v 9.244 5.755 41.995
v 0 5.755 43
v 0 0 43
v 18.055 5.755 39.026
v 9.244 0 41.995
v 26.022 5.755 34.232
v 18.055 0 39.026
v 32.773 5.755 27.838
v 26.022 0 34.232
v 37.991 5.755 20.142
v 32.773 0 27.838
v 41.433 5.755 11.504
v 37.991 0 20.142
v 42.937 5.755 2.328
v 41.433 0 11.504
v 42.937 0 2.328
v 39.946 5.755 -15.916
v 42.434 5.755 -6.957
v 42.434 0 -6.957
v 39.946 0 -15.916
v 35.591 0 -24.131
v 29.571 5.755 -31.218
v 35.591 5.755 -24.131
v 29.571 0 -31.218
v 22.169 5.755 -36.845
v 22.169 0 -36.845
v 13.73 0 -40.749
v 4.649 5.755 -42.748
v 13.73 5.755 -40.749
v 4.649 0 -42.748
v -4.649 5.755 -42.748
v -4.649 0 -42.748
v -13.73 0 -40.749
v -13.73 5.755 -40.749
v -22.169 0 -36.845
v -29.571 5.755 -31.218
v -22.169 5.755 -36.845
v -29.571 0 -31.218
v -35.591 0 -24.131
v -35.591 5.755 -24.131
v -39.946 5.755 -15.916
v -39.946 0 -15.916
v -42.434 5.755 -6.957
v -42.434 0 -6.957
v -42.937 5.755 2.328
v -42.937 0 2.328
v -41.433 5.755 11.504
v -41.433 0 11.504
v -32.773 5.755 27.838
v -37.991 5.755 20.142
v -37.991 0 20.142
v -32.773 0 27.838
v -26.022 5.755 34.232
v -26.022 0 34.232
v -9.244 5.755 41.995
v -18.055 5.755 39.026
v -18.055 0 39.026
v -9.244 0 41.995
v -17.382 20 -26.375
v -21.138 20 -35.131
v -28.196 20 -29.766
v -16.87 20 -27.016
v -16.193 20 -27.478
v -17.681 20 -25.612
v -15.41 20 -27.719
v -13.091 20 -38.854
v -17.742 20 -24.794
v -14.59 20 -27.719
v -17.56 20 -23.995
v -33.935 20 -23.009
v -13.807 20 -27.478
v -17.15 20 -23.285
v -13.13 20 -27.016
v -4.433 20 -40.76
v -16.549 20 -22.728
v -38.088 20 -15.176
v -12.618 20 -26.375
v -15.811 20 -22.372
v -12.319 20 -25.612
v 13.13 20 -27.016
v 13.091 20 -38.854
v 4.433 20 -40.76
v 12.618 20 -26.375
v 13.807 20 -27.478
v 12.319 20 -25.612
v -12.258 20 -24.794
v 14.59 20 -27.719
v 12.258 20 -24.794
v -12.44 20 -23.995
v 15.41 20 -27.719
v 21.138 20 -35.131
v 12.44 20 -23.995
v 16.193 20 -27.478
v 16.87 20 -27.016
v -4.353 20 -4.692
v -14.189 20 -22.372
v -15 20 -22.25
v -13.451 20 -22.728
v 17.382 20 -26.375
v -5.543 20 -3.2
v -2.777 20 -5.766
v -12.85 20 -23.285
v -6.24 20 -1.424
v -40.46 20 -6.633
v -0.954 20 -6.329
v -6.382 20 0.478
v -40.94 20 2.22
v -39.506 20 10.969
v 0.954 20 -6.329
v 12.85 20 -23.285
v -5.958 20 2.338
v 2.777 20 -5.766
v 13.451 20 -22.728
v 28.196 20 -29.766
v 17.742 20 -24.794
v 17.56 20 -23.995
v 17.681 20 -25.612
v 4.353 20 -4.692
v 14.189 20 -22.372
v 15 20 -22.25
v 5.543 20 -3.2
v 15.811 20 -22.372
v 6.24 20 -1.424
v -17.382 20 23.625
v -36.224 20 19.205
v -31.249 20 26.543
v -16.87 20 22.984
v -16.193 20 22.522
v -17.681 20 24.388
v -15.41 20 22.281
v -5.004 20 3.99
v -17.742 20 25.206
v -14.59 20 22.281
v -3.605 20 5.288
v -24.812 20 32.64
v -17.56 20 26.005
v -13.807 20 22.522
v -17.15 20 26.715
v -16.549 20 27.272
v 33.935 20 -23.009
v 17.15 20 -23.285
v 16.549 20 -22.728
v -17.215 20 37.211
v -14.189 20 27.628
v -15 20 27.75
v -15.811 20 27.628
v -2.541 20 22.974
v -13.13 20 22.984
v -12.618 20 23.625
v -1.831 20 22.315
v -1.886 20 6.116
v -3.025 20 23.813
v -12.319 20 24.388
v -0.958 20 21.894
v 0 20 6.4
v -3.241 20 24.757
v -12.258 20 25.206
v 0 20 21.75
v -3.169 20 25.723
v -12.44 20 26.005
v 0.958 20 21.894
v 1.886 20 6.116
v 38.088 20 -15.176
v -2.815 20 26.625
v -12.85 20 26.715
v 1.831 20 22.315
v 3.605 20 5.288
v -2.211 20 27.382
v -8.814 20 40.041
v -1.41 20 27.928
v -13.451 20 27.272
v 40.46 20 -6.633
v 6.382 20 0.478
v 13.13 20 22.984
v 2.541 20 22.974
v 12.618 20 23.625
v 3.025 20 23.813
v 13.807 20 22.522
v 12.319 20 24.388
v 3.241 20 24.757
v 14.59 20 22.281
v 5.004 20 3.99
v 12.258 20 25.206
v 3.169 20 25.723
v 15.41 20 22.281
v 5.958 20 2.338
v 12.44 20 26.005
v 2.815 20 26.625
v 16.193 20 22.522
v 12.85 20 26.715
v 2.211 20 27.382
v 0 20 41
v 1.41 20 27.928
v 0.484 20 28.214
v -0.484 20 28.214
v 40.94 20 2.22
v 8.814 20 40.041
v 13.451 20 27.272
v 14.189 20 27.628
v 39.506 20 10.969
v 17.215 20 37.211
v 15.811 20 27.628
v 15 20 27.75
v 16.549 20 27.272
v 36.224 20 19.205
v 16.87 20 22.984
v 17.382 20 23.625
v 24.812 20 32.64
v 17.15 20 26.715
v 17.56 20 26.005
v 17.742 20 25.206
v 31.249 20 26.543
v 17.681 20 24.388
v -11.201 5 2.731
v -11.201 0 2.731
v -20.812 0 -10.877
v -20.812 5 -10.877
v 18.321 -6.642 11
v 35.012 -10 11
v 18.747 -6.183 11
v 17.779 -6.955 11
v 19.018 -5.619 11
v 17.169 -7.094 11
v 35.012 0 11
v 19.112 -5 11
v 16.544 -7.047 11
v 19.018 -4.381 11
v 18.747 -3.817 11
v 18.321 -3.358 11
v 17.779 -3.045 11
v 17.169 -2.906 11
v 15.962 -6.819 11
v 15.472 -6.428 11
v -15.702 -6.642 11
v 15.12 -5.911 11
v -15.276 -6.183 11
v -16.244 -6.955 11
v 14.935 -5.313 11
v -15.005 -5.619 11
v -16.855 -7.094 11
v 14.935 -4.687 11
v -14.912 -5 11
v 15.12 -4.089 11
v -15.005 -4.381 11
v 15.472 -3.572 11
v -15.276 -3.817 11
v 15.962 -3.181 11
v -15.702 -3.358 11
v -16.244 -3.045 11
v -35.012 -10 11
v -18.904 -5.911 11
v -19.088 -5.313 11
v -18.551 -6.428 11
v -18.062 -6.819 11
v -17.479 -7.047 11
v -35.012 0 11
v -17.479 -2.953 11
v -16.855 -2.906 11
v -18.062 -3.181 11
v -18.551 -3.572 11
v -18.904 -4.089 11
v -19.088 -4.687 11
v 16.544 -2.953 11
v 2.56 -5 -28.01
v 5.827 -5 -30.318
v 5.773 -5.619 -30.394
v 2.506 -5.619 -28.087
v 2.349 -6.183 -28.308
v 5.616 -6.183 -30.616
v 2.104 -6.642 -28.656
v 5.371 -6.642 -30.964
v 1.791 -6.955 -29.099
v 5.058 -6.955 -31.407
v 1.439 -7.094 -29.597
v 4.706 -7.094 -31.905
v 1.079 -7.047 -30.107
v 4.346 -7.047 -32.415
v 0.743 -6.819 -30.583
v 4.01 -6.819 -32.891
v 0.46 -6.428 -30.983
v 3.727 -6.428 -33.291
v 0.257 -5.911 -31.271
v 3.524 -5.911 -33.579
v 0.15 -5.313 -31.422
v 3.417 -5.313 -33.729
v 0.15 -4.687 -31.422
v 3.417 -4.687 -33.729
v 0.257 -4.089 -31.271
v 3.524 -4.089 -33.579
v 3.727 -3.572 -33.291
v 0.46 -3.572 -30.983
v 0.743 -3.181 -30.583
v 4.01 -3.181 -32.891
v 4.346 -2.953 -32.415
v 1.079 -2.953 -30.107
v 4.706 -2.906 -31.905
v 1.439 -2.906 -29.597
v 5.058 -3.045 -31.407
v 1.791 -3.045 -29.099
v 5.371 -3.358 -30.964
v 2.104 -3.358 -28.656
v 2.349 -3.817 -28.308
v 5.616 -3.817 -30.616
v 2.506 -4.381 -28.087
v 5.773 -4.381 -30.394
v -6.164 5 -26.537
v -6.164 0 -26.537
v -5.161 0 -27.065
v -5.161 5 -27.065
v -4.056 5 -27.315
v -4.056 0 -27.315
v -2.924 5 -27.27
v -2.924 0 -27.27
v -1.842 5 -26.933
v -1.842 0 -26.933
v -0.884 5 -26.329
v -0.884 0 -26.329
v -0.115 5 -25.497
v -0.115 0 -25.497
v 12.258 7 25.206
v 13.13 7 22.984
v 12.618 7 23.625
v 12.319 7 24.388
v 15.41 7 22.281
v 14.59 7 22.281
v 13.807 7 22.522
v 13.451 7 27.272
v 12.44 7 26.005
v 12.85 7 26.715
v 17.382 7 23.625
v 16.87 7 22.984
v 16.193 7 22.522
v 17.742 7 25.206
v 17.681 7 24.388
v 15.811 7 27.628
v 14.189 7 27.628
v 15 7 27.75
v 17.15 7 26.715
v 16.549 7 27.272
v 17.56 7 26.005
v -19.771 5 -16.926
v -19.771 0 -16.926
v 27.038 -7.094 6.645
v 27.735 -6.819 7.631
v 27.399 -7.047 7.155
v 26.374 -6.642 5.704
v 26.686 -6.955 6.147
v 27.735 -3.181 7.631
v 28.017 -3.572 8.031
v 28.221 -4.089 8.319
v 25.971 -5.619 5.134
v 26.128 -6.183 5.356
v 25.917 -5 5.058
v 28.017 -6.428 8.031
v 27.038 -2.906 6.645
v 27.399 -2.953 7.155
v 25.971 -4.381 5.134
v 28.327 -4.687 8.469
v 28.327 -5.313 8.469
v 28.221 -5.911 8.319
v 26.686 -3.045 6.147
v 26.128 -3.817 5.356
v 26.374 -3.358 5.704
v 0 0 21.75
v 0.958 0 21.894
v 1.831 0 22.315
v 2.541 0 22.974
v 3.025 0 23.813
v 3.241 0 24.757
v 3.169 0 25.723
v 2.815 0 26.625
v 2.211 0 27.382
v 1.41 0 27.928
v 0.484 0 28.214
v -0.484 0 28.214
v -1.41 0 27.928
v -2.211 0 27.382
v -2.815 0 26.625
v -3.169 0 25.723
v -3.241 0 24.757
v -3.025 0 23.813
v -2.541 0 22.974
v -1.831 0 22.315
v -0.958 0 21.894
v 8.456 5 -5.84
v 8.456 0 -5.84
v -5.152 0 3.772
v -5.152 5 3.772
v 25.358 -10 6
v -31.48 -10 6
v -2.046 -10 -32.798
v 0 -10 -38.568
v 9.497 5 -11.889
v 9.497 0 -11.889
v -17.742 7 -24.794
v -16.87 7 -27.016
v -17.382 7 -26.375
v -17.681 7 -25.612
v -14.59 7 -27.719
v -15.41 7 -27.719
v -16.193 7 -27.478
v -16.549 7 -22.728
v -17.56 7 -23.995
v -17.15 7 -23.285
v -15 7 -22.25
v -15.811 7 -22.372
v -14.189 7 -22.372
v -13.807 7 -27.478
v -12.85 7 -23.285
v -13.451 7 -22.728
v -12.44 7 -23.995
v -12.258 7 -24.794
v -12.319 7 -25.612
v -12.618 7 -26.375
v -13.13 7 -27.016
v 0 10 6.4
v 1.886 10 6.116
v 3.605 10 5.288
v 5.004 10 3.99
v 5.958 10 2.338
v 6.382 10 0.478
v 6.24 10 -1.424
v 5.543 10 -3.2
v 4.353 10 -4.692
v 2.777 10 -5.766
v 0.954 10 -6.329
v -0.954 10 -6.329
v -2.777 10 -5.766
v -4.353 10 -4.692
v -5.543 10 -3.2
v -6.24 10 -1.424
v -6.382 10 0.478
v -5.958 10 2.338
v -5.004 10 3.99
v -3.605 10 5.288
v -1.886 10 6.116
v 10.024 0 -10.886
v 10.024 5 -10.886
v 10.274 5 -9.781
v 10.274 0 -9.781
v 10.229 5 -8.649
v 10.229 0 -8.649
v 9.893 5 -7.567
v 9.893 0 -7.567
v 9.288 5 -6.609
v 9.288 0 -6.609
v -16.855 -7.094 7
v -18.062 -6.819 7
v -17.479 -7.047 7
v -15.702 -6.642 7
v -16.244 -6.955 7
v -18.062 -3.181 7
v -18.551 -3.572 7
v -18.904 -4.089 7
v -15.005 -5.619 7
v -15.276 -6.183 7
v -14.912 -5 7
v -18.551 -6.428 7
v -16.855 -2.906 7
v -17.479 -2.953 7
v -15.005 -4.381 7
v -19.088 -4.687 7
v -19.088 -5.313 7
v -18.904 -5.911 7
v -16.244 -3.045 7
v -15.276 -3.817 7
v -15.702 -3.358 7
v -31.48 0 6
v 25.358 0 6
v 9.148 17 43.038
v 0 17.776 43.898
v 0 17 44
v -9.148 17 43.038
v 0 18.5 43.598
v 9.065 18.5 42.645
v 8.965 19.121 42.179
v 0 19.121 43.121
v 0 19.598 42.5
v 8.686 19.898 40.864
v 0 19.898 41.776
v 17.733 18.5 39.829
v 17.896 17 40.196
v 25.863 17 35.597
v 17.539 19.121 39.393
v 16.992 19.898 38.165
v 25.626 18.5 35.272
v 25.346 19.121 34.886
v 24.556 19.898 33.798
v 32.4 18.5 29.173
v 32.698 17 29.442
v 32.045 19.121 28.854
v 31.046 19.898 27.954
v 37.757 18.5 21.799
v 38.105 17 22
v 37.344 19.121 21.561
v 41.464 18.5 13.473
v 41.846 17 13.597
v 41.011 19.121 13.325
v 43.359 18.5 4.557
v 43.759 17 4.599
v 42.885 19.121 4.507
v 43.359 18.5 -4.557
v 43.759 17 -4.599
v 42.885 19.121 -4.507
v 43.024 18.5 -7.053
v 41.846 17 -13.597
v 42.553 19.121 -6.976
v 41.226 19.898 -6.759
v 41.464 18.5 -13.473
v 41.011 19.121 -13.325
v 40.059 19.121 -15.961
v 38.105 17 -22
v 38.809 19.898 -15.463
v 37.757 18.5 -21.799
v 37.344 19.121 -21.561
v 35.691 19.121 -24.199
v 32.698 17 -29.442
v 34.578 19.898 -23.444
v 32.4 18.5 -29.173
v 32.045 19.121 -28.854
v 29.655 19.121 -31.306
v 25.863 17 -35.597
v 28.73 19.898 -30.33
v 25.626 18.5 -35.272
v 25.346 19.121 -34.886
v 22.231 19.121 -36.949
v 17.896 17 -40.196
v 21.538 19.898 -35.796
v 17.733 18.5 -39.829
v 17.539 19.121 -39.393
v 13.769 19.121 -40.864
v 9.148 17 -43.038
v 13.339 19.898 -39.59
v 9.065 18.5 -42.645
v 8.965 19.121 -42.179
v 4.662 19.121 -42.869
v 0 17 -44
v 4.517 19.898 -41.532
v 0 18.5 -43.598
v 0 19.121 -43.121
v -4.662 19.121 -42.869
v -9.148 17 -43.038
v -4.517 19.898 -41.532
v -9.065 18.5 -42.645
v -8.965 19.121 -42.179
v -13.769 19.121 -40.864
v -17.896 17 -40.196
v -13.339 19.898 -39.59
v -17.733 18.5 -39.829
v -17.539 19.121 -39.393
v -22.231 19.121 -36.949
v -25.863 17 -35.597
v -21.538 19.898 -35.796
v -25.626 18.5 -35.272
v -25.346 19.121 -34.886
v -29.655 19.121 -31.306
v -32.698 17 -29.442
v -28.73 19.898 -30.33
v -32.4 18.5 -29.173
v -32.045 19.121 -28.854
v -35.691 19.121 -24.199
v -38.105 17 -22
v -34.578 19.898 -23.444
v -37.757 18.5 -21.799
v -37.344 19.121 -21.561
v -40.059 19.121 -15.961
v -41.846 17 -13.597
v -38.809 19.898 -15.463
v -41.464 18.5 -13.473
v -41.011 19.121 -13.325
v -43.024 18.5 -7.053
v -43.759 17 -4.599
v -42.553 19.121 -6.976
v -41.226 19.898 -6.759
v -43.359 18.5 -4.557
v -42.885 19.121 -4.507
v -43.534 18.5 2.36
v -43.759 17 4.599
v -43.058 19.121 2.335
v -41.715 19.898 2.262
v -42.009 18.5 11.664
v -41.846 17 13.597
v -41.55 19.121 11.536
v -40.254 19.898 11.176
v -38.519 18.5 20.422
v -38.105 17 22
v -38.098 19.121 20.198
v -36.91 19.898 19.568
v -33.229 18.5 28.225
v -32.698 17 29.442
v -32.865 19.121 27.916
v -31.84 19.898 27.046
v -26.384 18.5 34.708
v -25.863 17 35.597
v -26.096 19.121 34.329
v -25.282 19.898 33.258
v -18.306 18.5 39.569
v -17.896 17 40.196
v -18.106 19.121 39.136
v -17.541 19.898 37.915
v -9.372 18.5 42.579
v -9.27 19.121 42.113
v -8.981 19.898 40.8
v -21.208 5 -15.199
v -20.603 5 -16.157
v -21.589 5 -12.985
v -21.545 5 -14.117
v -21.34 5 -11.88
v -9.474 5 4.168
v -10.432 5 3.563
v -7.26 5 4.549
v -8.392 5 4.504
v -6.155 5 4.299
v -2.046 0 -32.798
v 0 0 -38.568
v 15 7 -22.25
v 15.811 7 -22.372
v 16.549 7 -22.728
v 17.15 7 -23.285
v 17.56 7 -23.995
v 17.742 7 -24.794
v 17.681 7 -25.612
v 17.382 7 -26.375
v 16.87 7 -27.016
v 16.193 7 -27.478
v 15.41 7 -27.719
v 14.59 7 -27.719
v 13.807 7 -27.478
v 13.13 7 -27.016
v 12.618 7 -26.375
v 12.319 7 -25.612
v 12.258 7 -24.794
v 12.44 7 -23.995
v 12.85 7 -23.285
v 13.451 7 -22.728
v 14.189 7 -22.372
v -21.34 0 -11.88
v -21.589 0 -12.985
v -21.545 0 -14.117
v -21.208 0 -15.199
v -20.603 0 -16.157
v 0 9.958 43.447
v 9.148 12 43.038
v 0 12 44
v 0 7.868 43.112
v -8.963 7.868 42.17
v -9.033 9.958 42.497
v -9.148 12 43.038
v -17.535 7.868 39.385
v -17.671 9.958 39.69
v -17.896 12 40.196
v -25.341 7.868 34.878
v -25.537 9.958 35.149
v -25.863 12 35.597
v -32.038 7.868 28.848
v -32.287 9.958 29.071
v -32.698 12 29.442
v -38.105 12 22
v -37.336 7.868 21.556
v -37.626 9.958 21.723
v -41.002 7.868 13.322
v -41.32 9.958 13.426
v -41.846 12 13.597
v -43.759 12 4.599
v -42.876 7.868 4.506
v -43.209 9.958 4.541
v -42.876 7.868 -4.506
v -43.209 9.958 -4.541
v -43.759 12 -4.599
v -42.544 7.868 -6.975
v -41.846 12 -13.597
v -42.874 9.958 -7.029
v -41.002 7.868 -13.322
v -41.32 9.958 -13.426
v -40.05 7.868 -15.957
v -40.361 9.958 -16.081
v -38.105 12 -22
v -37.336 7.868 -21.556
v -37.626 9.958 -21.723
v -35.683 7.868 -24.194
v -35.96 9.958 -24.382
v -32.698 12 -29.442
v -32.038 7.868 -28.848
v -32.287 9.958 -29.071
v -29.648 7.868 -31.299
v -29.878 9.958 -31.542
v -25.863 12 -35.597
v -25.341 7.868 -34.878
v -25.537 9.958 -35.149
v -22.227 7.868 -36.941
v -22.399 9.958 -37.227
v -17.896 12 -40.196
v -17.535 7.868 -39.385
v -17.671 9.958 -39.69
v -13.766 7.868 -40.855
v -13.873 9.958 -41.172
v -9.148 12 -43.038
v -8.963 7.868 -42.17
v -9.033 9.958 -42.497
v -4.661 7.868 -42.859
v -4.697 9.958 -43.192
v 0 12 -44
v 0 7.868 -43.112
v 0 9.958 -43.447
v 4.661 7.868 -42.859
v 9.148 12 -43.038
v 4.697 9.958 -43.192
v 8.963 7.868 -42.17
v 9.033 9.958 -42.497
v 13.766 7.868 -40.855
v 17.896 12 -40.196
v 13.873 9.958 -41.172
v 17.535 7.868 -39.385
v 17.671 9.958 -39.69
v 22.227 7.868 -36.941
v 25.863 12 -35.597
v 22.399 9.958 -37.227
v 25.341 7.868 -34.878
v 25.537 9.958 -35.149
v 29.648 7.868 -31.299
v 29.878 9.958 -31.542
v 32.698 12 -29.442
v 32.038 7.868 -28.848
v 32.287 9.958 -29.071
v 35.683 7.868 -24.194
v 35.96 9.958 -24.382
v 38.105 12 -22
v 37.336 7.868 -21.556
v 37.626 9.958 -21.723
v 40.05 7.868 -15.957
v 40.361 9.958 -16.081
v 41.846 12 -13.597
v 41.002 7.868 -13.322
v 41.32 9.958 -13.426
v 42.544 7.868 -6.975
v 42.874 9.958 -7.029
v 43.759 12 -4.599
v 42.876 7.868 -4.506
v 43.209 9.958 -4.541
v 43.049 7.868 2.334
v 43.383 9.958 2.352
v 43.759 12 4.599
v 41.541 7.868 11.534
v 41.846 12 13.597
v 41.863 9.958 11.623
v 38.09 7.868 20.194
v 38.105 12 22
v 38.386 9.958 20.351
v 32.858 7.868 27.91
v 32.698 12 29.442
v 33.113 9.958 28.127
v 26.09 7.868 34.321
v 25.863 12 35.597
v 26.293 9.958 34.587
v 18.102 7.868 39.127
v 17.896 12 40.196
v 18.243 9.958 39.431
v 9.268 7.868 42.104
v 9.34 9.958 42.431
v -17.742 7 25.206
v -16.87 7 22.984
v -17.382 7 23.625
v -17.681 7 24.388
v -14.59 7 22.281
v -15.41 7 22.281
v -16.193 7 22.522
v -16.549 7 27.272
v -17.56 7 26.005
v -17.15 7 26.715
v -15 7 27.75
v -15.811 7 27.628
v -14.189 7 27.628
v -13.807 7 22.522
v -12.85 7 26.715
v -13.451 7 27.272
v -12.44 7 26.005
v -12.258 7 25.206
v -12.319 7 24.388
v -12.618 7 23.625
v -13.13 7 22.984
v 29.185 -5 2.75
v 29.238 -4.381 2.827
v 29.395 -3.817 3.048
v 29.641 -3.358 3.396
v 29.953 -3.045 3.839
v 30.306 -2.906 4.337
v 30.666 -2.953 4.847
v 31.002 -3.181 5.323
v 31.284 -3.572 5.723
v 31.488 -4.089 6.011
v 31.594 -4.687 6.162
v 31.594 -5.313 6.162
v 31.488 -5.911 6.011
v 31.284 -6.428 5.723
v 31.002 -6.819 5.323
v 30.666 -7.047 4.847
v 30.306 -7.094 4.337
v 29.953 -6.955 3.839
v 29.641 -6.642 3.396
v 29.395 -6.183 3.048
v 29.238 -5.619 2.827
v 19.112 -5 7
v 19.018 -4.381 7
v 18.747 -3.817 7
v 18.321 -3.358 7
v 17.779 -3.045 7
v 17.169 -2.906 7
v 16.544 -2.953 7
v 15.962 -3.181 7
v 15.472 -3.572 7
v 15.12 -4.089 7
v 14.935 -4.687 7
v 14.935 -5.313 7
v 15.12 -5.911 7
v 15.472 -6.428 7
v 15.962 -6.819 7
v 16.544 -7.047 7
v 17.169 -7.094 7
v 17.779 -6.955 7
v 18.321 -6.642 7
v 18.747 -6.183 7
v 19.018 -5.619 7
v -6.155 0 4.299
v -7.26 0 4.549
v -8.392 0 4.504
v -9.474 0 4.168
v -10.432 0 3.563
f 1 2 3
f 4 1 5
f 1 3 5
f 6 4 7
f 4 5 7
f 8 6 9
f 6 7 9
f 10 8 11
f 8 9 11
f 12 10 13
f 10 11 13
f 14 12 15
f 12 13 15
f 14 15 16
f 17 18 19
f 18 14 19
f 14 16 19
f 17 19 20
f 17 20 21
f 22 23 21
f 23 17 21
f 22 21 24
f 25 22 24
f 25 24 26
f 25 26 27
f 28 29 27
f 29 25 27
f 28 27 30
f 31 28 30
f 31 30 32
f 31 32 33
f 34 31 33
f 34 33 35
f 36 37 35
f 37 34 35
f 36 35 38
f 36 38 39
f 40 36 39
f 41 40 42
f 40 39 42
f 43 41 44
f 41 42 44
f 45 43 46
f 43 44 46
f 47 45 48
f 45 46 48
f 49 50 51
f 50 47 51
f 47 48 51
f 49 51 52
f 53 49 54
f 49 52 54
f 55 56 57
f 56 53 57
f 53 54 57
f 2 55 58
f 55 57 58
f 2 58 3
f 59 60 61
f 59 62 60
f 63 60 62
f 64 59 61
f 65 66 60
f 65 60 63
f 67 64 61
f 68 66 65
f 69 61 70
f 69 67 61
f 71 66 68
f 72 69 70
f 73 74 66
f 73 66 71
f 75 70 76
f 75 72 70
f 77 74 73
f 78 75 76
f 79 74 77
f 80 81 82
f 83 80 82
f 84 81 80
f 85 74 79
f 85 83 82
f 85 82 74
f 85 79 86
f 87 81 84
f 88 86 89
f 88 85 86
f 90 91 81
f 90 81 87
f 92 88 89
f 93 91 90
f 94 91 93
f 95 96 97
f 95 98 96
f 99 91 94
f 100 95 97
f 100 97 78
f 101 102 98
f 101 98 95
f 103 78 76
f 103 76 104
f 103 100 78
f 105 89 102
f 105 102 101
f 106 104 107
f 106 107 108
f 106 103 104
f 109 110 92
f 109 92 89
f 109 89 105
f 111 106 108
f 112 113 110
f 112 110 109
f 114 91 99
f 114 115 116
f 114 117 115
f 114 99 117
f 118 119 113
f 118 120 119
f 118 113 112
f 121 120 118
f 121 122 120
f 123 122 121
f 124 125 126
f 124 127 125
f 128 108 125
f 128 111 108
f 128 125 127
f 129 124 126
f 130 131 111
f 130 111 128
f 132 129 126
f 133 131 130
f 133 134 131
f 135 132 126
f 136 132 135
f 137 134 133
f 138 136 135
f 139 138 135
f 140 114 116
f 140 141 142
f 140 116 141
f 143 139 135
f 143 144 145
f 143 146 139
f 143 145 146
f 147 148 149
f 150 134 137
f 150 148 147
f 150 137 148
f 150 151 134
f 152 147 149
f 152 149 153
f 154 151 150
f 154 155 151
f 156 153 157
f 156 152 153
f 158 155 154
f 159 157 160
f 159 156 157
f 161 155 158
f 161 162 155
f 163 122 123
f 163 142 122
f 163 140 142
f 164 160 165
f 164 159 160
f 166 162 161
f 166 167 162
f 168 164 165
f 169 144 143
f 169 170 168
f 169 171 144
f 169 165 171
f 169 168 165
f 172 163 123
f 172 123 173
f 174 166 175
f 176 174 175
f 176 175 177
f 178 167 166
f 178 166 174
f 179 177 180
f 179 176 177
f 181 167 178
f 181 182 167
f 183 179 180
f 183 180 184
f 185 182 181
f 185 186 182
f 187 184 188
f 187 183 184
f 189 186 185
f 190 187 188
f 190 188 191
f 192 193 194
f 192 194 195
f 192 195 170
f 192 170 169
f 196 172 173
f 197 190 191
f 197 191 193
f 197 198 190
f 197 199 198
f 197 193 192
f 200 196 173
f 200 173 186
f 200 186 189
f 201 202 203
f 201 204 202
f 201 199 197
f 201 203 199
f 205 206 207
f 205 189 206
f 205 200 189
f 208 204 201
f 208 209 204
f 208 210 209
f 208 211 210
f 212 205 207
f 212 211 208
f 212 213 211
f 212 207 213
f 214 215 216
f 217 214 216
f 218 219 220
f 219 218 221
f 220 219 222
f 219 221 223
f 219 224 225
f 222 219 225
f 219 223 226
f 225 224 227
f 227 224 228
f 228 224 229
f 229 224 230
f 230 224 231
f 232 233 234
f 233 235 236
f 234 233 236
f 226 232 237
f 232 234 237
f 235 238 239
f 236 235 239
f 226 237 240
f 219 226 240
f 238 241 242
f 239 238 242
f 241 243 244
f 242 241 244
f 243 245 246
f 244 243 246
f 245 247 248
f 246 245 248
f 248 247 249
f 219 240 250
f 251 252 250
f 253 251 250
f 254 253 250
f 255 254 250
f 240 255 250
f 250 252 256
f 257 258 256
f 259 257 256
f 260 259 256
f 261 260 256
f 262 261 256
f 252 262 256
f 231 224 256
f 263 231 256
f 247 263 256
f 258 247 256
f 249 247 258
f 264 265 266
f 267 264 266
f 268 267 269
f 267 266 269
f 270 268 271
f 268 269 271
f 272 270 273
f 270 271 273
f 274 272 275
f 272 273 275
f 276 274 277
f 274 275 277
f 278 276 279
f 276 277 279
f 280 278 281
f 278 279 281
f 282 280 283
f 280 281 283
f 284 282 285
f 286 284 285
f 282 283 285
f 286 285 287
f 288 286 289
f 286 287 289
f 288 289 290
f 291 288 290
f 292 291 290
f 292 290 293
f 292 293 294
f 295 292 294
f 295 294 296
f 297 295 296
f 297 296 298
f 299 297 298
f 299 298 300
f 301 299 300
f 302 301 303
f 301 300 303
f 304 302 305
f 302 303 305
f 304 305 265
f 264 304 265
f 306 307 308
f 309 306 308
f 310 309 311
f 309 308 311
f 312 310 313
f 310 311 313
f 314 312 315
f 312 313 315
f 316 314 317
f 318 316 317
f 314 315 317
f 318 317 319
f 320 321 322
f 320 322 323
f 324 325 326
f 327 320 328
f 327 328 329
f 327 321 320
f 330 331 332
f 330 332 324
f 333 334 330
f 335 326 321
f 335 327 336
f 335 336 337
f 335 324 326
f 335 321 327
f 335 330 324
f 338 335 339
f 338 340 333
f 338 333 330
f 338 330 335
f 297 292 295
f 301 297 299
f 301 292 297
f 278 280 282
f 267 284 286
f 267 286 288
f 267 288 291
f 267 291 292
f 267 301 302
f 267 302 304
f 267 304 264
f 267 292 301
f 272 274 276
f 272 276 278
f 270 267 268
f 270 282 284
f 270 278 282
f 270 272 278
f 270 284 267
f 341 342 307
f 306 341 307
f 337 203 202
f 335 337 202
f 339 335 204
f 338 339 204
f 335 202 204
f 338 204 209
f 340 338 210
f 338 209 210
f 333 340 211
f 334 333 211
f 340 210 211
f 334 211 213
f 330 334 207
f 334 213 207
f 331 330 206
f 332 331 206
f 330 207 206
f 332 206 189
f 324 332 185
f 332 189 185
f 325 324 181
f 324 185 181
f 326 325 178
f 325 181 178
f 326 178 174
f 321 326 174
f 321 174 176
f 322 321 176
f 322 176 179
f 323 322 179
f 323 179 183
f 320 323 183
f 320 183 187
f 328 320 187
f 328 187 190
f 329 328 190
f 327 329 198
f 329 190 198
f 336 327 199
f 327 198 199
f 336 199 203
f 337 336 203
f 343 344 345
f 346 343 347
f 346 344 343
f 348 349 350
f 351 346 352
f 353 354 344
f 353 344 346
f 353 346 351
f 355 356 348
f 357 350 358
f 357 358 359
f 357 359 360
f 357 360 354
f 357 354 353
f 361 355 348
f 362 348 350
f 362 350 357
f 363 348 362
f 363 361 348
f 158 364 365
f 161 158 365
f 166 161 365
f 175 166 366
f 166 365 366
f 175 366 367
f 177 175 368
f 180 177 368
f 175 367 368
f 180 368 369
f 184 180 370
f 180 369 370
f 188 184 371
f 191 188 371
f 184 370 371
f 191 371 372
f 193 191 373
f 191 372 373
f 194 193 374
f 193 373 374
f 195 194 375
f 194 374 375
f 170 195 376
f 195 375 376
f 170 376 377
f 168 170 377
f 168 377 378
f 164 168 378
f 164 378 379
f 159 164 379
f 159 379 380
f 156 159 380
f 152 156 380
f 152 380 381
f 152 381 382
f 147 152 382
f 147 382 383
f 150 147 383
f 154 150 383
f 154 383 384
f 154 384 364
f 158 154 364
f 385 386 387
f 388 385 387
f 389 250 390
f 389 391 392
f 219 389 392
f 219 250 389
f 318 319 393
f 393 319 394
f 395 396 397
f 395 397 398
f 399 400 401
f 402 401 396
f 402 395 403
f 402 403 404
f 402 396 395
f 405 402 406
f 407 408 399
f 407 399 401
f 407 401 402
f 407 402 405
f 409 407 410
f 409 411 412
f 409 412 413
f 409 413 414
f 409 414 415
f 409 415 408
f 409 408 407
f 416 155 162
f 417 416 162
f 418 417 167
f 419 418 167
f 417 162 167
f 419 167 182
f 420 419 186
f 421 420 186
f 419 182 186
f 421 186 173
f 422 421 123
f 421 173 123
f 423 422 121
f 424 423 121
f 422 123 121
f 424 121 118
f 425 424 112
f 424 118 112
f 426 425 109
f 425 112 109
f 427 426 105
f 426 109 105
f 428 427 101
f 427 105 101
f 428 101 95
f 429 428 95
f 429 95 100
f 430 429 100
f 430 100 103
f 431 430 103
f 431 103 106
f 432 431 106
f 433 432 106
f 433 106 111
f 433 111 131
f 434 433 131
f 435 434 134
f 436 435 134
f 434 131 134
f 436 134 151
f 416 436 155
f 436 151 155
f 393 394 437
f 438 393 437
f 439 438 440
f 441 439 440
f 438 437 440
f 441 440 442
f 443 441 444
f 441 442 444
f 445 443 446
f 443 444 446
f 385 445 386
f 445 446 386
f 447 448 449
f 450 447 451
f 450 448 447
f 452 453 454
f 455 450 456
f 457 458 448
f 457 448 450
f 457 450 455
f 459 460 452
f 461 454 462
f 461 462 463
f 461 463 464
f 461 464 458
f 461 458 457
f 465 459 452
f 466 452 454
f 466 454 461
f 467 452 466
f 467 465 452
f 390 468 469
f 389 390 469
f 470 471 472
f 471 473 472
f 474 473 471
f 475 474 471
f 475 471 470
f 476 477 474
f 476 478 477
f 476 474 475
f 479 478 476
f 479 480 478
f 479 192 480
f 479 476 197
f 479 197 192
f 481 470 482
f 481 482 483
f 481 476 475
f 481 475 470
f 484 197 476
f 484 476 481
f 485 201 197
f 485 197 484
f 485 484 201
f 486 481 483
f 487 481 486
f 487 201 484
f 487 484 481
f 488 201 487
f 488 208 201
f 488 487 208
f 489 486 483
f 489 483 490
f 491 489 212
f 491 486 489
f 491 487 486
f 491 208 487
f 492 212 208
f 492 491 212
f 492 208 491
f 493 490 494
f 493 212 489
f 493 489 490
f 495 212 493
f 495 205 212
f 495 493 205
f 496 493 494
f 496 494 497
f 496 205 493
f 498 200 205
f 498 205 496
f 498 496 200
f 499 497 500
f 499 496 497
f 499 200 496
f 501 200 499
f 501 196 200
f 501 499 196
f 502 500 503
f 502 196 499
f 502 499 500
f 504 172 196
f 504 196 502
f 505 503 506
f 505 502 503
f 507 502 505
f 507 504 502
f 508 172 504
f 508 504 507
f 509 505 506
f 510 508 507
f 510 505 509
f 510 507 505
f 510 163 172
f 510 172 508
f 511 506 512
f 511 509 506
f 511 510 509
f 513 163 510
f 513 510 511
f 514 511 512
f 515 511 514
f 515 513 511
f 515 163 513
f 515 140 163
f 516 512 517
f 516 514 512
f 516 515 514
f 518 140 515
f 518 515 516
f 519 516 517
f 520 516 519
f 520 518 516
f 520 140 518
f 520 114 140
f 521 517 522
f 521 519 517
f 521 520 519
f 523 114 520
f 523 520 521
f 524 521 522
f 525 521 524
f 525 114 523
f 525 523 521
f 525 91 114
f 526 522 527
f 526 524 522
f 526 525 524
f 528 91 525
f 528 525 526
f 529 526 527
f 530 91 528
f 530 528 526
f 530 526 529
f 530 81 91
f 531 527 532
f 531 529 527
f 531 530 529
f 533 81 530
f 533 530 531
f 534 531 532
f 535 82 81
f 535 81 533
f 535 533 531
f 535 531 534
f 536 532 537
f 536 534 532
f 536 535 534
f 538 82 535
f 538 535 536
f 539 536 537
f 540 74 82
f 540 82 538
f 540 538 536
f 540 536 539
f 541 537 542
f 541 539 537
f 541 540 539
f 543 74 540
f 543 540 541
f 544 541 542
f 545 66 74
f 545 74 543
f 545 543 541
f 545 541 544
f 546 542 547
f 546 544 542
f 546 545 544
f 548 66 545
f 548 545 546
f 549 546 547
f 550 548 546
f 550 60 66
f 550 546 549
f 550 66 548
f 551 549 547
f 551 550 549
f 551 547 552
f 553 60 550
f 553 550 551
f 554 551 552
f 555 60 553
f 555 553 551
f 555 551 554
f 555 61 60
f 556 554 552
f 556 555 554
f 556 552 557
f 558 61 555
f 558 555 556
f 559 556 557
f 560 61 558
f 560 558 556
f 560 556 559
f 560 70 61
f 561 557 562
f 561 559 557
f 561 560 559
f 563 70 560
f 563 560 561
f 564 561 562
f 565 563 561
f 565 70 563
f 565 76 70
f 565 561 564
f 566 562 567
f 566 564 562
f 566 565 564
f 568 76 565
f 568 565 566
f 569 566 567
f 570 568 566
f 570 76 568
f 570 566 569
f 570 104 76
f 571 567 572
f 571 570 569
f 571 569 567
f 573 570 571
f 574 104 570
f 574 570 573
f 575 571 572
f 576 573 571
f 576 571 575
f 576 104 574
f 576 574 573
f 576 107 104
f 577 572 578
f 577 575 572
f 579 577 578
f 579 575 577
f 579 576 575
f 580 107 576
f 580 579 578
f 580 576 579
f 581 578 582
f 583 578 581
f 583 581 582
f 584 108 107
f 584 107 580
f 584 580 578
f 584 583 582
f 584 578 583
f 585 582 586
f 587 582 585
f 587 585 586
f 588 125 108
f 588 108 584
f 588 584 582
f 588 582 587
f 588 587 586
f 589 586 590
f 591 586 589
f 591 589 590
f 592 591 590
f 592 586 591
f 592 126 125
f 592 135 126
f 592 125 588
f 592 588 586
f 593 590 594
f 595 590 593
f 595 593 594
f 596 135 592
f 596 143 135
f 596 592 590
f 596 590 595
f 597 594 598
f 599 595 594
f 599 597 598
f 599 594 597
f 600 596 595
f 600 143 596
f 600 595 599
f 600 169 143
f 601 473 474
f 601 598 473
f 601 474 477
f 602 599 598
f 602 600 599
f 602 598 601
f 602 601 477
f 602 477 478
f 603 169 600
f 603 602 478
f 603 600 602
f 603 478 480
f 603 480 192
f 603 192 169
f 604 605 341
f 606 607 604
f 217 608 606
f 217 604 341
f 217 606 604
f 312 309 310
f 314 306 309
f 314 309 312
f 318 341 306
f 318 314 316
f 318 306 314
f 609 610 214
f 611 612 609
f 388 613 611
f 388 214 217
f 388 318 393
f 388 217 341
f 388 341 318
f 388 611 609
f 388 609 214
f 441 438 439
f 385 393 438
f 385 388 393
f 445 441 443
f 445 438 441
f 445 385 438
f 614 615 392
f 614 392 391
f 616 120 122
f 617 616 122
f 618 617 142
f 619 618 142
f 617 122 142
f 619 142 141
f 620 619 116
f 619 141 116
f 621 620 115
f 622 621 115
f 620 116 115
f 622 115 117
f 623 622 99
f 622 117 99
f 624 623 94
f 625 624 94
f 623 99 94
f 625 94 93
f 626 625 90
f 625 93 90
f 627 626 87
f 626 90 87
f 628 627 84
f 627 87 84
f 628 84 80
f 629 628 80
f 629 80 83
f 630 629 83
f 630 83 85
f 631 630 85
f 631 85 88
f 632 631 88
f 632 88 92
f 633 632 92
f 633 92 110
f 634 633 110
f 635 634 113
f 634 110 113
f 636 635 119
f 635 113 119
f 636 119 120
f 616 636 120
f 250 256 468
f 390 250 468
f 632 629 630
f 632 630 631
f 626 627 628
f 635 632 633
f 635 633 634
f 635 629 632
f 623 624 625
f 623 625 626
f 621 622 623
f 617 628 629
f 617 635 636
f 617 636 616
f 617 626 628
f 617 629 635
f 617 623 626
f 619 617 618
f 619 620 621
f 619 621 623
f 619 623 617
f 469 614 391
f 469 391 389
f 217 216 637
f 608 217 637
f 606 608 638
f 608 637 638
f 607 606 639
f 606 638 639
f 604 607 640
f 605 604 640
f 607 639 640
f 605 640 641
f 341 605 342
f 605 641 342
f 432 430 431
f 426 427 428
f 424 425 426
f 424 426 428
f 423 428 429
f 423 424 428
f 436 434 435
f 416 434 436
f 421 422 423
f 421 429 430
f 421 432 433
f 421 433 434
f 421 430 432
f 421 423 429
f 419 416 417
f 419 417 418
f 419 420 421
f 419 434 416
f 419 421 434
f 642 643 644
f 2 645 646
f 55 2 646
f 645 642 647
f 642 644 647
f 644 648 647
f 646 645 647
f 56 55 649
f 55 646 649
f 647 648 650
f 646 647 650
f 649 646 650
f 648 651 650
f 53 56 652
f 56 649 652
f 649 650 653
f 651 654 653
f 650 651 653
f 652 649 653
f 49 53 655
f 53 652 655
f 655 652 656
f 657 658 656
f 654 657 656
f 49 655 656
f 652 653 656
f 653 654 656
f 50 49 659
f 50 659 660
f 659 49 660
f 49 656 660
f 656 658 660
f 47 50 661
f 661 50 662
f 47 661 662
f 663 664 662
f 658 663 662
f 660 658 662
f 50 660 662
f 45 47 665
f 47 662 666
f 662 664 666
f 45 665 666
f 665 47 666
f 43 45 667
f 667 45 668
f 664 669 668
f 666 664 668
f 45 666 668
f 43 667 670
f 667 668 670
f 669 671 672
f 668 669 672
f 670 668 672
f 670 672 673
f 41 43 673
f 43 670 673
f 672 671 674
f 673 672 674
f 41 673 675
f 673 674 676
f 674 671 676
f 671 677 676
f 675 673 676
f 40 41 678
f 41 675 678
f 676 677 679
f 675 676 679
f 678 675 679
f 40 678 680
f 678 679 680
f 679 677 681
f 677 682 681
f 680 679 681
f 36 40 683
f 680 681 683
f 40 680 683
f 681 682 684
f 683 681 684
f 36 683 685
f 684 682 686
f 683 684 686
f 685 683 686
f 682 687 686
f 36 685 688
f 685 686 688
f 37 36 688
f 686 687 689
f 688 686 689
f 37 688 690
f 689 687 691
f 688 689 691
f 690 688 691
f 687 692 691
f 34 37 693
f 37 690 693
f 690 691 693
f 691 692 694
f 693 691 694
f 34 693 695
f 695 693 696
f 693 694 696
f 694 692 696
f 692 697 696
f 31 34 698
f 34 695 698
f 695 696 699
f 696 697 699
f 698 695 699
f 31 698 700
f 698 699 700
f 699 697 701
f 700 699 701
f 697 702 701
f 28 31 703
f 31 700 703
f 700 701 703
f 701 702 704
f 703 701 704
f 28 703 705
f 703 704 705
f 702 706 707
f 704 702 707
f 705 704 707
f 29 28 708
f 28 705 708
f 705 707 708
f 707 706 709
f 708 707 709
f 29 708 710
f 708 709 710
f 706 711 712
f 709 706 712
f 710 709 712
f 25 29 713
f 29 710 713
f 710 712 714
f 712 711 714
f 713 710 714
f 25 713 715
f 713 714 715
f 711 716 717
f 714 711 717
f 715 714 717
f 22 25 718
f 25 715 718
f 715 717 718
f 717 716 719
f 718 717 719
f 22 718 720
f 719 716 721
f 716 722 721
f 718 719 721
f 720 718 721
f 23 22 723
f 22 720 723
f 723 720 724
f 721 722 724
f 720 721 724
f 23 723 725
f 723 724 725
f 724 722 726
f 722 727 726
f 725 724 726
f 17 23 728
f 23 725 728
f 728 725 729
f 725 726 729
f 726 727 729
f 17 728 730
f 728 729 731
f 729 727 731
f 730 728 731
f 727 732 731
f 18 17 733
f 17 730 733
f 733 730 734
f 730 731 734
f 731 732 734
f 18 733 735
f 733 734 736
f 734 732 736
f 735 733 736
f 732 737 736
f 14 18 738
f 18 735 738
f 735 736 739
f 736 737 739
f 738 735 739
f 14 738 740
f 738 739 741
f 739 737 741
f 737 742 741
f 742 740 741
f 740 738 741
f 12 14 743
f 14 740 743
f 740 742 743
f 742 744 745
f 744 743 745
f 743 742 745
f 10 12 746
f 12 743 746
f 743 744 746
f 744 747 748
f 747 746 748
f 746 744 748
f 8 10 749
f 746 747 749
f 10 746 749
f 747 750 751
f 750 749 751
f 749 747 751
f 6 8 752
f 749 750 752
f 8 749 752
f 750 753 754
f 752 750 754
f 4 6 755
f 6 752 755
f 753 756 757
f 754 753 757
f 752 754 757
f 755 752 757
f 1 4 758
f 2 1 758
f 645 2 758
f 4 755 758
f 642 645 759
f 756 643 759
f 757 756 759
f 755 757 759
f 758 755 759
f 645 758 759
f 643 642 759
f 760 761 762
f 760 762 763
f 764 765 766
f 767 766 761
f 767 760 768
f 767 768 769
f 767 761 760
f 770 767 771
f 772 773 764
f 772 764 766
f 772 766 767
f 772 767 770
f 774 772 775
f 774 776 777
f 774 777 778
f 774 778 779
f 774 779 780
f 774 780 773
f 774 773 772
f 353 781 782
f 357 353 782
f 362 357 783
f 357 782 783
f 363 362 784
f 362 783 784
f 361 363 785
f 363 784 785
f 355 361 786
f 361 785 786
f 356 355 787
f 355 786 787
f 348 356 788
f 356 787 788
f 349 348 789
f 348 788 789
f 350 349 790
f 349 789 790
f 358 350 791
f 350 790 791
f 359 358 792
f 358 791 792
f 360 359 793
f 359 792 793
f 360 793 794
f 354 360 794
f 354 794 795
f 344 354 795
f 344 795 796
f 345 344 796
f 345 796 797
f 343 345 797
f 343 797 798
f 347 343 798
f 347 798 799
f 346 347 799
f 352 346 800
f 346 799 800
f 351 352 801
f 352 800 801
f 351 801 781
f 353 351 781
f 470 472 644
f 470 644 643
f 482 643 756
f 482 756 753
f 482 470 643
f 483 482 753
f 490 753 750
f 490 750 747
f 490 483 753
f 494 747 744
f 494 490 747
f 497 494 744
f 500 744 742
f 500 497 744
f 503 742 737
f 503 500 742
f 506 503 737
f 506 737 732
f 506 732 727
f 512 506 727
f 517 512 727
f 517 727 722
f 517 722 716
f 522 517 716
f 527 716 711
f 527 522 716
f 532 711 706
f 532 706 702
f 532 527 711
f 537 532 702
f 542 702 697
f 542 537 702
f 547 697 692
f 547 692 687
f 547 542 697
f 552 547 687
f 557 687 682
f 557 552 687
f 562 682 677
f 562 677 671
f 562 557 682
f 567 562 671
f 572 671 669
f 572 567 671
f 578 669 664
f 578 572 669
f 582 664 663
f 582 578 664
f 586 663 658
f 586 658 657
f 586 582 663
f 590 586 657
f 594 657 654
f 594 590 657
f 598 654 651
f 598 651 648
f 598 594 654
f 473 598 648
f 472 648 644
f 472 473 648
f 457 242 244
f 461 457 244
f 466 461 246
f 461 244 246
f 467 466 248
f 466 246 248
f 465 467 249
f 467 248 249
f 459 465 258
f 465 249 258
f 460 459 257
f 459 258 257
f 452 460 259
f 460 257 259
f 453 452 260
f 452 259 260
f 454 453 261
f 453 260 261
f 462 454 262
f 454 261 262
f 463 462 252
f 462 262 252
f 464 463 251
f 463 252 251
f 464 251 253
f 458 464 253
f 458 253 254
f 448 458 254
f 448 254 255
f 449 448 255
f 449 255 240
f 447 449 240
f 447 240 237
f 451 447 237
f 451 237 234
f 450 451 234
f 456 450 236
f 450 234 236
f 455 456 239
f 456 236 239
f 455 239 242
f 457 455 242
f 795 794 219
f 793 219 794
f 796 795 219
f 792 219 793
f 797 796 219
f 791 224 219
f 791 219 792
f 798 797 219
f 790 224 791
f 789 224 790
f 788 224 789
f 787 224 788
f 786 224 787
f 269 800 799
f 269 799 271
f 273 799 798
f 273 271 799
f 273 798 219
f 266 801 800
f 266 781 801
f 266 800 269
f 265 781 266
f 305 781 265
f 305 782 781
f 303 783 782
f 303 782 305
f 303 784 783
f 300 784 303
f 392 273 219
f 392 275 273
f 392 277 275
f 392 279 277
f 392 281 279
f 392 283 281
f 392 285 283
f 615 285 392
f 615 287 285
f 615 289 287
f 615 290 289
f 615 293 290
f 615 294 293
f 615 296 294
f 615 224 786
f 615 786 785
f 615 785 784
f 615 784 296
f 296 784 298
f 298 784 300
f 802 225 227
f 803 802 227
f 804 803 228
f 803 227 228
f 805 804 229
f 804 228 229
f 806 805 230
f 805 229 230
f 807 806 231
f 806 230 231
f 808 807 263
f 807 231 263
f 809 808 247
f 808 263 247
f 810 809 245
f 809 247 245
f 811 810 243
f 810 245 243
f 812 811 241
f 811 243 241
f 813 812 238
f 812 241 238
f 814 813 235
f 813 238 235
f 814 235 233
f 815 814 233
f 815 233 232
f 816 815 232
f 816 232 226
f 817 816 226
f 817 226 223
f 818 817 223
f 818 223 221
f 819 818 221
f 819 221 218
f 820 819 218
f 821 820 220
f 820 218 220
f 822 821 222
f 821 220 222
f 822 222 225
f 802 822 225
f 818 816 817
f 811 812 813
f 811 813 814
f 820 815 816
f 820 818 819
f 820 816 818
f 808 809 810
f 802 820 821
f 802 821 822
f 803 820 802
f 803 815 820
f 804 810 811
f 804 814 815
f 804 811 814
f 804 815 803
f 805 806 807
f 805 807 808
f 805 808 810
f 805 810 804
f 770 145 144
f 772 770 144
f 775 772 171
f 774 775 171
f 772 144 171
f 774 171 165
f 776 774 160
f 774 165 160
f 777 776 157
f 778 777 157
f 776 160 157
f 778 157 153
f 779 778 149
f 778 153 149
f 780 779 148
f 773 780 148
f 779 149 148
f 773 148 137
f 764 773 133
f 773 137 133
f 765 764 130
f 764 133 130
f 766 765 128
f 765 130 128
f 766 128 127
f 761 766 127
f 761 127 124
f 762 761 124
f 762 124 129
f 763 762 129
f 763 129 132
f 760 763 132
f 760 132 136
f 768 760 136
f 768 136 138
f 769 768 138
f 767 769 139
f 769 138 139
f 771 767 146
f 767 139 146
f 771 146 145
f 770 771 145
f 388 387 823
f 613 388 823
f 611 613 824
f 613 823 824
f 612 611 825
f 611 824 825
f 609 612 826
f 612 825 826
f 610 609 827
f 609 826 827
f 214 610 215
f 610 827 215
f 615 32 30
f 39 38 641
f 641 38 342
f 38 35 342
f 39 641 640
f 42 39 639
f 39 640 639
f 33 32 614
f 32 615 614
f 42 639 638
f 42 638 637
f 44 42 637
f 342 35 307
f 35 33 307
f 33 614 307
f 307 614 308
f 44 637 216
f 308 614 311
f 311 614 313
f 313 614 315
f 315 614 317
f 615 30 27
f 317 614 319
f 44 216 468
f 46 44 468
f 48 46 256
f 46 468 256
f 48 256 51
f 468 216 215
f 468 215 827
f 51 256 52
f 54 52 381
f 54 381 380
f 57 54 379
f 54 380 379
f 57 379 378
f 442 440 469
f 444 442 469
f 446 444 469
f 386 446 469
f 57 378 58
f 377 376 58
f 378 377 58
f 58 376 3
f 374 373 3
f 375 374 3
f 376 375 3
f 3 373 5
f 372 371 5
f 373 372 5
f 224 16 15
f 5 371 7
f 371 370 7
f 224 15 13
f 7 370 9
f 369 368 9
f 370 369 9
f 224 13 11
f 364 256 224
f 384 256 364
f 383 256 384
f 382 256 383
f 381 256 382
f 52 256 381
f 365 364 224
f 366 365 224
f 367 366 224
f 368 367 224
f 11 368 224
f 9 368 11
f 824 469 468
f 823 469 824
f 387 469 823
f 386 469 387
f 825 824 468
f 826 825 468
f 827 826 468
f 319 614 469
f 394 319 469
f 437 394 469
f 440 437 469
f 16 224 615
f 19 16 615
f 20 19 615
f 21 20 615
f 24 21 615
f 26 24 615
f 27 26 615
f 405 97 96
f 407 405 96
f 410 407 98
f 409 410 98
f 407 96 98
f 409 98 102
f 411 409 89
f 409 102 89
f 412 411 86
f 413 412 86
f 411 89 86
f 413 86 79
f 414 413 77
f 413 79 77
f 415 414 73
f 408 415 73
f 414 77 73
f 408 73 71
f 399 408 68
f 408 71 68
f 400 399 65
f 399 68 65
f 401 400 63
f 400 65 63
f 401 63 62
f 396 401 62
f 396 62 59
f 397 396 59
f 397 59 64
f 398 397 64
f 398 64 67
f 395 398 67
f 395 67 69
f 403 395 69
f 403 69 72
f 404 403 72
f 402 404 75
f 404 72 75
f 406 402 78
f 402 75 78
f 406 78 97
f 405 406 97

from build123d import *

# Parameters (mm, degrees)
SKETCH1_R             = 43
BOSS_EXTRUDE1_DEPTH   = 20
SKETCH2_R             = 44
BOSS_EXTRUDE2_DEPTH   = 8
FILLET1_R             = 20
BOSS_EXTRUDE3_DEPTH   = 10
SKETCH5_R             = 2.1
CUT_EXTRUDE1_DEPTH    = 4
CUT_EXTRUDE2_DEPTH    = 5
FILLET2_R             = 3
BOSS_EXTRUDE4_DEPTH   = 10
SKETCH10_R            = 2.1
CUT_EXTRUDE3_DEPTH    = 4
SKETCH11_R            = 3.25
CUT_EXTRUDE4_DEPTH    = 47
CROQUIS1_R            = 2.75
CORTAR_EXTRUIR1_DEPTH = 13
CROQUIS2_R            = 6.4
CORTAR_EXTRUIR2_DEPTH = 10


with BuildPart() as part:
    # Sketch1 → Boss-Extrude1 (new body)
    with BuildSketch(Plane(origin=(0, 0, 0), x_dir=(1, 0, 0), z_dir=(0, 1, 0))):
        with Locations(Location((0, 0, 0), (0, 0, 270))):
            Circle(SKETCH1_R)
    extrude(amount=BOSS_EXTRUDE1_DEPTH)

    # Sketch2 → Boss-Extrude2 (add)
    with BuildSketch(Plane(origin=(0, 20, 0), x_dir=(1, 0, 0), z_dir=(0, 1, 0))):
        with Locations(Location((0, 0, 0), (0, 0, 270))):
            Circle(SKETCH2_R)
    extrude(amount=-BOSS_EXTRUDE2_DEPTH)

    # Fillet1
    # the kernel refuses this fillet: 20 mm, written as the material it adds along each edge
    with BuildSketch(Plane(origin=(0, 12, 0), x_dir=(0, 0, 1), z_dir=(1, 0, 0))) as fillet1_piece_1:
        with BuildLine():
            CenterArc((63, 6.244997998), FILLET1_R, 180, 18.194872339)
            Line((44, 0), (43, 0))
            Line((43, 0), (43, 6.244997998))
        make_face()
    revolve(axis=Axis((0, 12, 0), (0, -1, 0)))

    # Sketch4 → Boss-Extrude3 (add)
    with BuildSketch(Plane.XZ):
        Polygon((28.890073358, 11), (35.011581558, 11), (0, -38.567688166), (-2.046413556, -32.798368085), align=None)
    extrude(amount=BOSS_EXTRUDE3_DEPTH)

    # Sketch5 → Cut-Extrude1 (cut)
    with BuildSketch(Plane(origin=(18.174388611, 0, -12.837275908), x_dir=(-0.576932008090494, 0, -0.8167921755505927), z_dir=(0.8167921755505927, 0, -0.576932008090494))):
        with Locations((-21.184015986, -5)):
            Circle(SKETCH5_R)
        with Locations(Location((23.501785923, -5, 0), (0, 0, 180))):
            Circle(SKETCH5_R)
    extrude(amount=-CUT_EXTRUDE1_DEPTH, mode=Mode.SUBTRACT)

    # Sketch7 → Cut-Extrude2 (cut)
    with BuildSketch(Plane.XZ):
        with BuildLine():
            Line((8.455950561, -5.839980603), (-5.151807084, 3.771706651))
            ThreePointArc((-5.151807084, 3.771706651), (-8.391785298, 4.503949914), (-11.200570041, 2.730713525))
            Line((-11.200570041, 2.730713525), (-20.812257296, -10.87704412))
            ThreePointArc((-20.812257296, -10.87704412), (-21.544500559, -14.117022334), (-19.771264169, -16.925807077))
            Line((-19.771264169, -16.925807077), (-6.163506524, -26.537494332))
            ThreePointArc((-6.163506524, -26.537494332), (-2.92352831, -27.269737595), (-0.114743567, -25.496501205))
            Line((-0.114743567, -25.496501205), (9.496943688, -11.88874356))
            ThreePointArc((9.496943688, -11.88874356), (10.22918695, -8.648765346), (8.455950561, -5.839980603))
        make_face()
    extrude(amount=-CUT_EXTRUDE2_DEPTH, mode=Mode.SUBTRACT)

    # Fillet2
    fillet2_edges = [part.edges().sort_by_distance(p)[0] for p in [
        (0, 20, -44),
    ]]
    fillet(fillet2_edges, radius=FILLET2_R)

    # Sketch8 → Boss-Extrude4 (add)
    with BuildSketch(Plane.XZ):
        Polygon((28.890073358, 11), (-35.011581558, 11), (-31.47988754, 6), (25.35837934, 6), align=None)
    extrude(amount=BOSS_EXTRUDE4_DEPTH)

    # Sketch10 → Cut-Extrude3 (cut)
    with BuildSketch(Plane.XY.offset(11)):
        with Locations((-17.011581558, -5)):
            Circle(SKETCH10_R)
        with Locations((17.011581558, -5)):
            Circle(SKETCH10_R)
    extrude(amount=-CUT_EXTRUDE3_DEPTH, mode=Mode.SUBTRACT)

    # Sketch11 → Cut-Extrude4 (cut)
    with BuildSketch(Plane.XZ):
        with Locations(Location((0, 25, 0), (0, 0, 270))):
            Circle(SKETCH11_R)
    extrude(amount=-CUT_EXTRUDE4_DEPTH, mode=Mode.SUBTRACT)

    # Croquis1 → Cortar-Extruir1 (cut)
    with BuildSketch(Plane(origin=(0, 20, 0), x_dir=(1, 0, 0), z_dir=(0, 1, 0))):
        with Locations(Location((-15, 25, 0), (0, 0, 270))):
            Circle(CROQUIS1_R)
        with Locations(Location((15, 25, 0), (0, 0, 270))):
            Circle(CROQUIS1_R)
        with Locations(Location((15, -25, 0), (0, 0, 270))):
            Circle(CROQUIS1_R)
        with Locations(Location((-15, -25, 0), (0, 0, 270))):
            Circle(CROQUIS1_R)
    extrude(amount=-CORTAR_EXTRUIR1_DEPTH, mode=Mode.SUBTRACT)

    # Croquis2 → Cortar-Extruir2 (cut)
    with BuildSketch(Plane(origin=(0, 20, 0), x_dir=(1, 0, 0), z_dir=(0, 1, 0))):
        with Locations(Location((0, 0, 0), (0, 0, 270))):
            Circle(CROQUIS2_R)
    extrude(amount=-CORTAR_EXTRUIR2_DEPTH, mode=Mode.SUBTRACT)


solid = part.part
